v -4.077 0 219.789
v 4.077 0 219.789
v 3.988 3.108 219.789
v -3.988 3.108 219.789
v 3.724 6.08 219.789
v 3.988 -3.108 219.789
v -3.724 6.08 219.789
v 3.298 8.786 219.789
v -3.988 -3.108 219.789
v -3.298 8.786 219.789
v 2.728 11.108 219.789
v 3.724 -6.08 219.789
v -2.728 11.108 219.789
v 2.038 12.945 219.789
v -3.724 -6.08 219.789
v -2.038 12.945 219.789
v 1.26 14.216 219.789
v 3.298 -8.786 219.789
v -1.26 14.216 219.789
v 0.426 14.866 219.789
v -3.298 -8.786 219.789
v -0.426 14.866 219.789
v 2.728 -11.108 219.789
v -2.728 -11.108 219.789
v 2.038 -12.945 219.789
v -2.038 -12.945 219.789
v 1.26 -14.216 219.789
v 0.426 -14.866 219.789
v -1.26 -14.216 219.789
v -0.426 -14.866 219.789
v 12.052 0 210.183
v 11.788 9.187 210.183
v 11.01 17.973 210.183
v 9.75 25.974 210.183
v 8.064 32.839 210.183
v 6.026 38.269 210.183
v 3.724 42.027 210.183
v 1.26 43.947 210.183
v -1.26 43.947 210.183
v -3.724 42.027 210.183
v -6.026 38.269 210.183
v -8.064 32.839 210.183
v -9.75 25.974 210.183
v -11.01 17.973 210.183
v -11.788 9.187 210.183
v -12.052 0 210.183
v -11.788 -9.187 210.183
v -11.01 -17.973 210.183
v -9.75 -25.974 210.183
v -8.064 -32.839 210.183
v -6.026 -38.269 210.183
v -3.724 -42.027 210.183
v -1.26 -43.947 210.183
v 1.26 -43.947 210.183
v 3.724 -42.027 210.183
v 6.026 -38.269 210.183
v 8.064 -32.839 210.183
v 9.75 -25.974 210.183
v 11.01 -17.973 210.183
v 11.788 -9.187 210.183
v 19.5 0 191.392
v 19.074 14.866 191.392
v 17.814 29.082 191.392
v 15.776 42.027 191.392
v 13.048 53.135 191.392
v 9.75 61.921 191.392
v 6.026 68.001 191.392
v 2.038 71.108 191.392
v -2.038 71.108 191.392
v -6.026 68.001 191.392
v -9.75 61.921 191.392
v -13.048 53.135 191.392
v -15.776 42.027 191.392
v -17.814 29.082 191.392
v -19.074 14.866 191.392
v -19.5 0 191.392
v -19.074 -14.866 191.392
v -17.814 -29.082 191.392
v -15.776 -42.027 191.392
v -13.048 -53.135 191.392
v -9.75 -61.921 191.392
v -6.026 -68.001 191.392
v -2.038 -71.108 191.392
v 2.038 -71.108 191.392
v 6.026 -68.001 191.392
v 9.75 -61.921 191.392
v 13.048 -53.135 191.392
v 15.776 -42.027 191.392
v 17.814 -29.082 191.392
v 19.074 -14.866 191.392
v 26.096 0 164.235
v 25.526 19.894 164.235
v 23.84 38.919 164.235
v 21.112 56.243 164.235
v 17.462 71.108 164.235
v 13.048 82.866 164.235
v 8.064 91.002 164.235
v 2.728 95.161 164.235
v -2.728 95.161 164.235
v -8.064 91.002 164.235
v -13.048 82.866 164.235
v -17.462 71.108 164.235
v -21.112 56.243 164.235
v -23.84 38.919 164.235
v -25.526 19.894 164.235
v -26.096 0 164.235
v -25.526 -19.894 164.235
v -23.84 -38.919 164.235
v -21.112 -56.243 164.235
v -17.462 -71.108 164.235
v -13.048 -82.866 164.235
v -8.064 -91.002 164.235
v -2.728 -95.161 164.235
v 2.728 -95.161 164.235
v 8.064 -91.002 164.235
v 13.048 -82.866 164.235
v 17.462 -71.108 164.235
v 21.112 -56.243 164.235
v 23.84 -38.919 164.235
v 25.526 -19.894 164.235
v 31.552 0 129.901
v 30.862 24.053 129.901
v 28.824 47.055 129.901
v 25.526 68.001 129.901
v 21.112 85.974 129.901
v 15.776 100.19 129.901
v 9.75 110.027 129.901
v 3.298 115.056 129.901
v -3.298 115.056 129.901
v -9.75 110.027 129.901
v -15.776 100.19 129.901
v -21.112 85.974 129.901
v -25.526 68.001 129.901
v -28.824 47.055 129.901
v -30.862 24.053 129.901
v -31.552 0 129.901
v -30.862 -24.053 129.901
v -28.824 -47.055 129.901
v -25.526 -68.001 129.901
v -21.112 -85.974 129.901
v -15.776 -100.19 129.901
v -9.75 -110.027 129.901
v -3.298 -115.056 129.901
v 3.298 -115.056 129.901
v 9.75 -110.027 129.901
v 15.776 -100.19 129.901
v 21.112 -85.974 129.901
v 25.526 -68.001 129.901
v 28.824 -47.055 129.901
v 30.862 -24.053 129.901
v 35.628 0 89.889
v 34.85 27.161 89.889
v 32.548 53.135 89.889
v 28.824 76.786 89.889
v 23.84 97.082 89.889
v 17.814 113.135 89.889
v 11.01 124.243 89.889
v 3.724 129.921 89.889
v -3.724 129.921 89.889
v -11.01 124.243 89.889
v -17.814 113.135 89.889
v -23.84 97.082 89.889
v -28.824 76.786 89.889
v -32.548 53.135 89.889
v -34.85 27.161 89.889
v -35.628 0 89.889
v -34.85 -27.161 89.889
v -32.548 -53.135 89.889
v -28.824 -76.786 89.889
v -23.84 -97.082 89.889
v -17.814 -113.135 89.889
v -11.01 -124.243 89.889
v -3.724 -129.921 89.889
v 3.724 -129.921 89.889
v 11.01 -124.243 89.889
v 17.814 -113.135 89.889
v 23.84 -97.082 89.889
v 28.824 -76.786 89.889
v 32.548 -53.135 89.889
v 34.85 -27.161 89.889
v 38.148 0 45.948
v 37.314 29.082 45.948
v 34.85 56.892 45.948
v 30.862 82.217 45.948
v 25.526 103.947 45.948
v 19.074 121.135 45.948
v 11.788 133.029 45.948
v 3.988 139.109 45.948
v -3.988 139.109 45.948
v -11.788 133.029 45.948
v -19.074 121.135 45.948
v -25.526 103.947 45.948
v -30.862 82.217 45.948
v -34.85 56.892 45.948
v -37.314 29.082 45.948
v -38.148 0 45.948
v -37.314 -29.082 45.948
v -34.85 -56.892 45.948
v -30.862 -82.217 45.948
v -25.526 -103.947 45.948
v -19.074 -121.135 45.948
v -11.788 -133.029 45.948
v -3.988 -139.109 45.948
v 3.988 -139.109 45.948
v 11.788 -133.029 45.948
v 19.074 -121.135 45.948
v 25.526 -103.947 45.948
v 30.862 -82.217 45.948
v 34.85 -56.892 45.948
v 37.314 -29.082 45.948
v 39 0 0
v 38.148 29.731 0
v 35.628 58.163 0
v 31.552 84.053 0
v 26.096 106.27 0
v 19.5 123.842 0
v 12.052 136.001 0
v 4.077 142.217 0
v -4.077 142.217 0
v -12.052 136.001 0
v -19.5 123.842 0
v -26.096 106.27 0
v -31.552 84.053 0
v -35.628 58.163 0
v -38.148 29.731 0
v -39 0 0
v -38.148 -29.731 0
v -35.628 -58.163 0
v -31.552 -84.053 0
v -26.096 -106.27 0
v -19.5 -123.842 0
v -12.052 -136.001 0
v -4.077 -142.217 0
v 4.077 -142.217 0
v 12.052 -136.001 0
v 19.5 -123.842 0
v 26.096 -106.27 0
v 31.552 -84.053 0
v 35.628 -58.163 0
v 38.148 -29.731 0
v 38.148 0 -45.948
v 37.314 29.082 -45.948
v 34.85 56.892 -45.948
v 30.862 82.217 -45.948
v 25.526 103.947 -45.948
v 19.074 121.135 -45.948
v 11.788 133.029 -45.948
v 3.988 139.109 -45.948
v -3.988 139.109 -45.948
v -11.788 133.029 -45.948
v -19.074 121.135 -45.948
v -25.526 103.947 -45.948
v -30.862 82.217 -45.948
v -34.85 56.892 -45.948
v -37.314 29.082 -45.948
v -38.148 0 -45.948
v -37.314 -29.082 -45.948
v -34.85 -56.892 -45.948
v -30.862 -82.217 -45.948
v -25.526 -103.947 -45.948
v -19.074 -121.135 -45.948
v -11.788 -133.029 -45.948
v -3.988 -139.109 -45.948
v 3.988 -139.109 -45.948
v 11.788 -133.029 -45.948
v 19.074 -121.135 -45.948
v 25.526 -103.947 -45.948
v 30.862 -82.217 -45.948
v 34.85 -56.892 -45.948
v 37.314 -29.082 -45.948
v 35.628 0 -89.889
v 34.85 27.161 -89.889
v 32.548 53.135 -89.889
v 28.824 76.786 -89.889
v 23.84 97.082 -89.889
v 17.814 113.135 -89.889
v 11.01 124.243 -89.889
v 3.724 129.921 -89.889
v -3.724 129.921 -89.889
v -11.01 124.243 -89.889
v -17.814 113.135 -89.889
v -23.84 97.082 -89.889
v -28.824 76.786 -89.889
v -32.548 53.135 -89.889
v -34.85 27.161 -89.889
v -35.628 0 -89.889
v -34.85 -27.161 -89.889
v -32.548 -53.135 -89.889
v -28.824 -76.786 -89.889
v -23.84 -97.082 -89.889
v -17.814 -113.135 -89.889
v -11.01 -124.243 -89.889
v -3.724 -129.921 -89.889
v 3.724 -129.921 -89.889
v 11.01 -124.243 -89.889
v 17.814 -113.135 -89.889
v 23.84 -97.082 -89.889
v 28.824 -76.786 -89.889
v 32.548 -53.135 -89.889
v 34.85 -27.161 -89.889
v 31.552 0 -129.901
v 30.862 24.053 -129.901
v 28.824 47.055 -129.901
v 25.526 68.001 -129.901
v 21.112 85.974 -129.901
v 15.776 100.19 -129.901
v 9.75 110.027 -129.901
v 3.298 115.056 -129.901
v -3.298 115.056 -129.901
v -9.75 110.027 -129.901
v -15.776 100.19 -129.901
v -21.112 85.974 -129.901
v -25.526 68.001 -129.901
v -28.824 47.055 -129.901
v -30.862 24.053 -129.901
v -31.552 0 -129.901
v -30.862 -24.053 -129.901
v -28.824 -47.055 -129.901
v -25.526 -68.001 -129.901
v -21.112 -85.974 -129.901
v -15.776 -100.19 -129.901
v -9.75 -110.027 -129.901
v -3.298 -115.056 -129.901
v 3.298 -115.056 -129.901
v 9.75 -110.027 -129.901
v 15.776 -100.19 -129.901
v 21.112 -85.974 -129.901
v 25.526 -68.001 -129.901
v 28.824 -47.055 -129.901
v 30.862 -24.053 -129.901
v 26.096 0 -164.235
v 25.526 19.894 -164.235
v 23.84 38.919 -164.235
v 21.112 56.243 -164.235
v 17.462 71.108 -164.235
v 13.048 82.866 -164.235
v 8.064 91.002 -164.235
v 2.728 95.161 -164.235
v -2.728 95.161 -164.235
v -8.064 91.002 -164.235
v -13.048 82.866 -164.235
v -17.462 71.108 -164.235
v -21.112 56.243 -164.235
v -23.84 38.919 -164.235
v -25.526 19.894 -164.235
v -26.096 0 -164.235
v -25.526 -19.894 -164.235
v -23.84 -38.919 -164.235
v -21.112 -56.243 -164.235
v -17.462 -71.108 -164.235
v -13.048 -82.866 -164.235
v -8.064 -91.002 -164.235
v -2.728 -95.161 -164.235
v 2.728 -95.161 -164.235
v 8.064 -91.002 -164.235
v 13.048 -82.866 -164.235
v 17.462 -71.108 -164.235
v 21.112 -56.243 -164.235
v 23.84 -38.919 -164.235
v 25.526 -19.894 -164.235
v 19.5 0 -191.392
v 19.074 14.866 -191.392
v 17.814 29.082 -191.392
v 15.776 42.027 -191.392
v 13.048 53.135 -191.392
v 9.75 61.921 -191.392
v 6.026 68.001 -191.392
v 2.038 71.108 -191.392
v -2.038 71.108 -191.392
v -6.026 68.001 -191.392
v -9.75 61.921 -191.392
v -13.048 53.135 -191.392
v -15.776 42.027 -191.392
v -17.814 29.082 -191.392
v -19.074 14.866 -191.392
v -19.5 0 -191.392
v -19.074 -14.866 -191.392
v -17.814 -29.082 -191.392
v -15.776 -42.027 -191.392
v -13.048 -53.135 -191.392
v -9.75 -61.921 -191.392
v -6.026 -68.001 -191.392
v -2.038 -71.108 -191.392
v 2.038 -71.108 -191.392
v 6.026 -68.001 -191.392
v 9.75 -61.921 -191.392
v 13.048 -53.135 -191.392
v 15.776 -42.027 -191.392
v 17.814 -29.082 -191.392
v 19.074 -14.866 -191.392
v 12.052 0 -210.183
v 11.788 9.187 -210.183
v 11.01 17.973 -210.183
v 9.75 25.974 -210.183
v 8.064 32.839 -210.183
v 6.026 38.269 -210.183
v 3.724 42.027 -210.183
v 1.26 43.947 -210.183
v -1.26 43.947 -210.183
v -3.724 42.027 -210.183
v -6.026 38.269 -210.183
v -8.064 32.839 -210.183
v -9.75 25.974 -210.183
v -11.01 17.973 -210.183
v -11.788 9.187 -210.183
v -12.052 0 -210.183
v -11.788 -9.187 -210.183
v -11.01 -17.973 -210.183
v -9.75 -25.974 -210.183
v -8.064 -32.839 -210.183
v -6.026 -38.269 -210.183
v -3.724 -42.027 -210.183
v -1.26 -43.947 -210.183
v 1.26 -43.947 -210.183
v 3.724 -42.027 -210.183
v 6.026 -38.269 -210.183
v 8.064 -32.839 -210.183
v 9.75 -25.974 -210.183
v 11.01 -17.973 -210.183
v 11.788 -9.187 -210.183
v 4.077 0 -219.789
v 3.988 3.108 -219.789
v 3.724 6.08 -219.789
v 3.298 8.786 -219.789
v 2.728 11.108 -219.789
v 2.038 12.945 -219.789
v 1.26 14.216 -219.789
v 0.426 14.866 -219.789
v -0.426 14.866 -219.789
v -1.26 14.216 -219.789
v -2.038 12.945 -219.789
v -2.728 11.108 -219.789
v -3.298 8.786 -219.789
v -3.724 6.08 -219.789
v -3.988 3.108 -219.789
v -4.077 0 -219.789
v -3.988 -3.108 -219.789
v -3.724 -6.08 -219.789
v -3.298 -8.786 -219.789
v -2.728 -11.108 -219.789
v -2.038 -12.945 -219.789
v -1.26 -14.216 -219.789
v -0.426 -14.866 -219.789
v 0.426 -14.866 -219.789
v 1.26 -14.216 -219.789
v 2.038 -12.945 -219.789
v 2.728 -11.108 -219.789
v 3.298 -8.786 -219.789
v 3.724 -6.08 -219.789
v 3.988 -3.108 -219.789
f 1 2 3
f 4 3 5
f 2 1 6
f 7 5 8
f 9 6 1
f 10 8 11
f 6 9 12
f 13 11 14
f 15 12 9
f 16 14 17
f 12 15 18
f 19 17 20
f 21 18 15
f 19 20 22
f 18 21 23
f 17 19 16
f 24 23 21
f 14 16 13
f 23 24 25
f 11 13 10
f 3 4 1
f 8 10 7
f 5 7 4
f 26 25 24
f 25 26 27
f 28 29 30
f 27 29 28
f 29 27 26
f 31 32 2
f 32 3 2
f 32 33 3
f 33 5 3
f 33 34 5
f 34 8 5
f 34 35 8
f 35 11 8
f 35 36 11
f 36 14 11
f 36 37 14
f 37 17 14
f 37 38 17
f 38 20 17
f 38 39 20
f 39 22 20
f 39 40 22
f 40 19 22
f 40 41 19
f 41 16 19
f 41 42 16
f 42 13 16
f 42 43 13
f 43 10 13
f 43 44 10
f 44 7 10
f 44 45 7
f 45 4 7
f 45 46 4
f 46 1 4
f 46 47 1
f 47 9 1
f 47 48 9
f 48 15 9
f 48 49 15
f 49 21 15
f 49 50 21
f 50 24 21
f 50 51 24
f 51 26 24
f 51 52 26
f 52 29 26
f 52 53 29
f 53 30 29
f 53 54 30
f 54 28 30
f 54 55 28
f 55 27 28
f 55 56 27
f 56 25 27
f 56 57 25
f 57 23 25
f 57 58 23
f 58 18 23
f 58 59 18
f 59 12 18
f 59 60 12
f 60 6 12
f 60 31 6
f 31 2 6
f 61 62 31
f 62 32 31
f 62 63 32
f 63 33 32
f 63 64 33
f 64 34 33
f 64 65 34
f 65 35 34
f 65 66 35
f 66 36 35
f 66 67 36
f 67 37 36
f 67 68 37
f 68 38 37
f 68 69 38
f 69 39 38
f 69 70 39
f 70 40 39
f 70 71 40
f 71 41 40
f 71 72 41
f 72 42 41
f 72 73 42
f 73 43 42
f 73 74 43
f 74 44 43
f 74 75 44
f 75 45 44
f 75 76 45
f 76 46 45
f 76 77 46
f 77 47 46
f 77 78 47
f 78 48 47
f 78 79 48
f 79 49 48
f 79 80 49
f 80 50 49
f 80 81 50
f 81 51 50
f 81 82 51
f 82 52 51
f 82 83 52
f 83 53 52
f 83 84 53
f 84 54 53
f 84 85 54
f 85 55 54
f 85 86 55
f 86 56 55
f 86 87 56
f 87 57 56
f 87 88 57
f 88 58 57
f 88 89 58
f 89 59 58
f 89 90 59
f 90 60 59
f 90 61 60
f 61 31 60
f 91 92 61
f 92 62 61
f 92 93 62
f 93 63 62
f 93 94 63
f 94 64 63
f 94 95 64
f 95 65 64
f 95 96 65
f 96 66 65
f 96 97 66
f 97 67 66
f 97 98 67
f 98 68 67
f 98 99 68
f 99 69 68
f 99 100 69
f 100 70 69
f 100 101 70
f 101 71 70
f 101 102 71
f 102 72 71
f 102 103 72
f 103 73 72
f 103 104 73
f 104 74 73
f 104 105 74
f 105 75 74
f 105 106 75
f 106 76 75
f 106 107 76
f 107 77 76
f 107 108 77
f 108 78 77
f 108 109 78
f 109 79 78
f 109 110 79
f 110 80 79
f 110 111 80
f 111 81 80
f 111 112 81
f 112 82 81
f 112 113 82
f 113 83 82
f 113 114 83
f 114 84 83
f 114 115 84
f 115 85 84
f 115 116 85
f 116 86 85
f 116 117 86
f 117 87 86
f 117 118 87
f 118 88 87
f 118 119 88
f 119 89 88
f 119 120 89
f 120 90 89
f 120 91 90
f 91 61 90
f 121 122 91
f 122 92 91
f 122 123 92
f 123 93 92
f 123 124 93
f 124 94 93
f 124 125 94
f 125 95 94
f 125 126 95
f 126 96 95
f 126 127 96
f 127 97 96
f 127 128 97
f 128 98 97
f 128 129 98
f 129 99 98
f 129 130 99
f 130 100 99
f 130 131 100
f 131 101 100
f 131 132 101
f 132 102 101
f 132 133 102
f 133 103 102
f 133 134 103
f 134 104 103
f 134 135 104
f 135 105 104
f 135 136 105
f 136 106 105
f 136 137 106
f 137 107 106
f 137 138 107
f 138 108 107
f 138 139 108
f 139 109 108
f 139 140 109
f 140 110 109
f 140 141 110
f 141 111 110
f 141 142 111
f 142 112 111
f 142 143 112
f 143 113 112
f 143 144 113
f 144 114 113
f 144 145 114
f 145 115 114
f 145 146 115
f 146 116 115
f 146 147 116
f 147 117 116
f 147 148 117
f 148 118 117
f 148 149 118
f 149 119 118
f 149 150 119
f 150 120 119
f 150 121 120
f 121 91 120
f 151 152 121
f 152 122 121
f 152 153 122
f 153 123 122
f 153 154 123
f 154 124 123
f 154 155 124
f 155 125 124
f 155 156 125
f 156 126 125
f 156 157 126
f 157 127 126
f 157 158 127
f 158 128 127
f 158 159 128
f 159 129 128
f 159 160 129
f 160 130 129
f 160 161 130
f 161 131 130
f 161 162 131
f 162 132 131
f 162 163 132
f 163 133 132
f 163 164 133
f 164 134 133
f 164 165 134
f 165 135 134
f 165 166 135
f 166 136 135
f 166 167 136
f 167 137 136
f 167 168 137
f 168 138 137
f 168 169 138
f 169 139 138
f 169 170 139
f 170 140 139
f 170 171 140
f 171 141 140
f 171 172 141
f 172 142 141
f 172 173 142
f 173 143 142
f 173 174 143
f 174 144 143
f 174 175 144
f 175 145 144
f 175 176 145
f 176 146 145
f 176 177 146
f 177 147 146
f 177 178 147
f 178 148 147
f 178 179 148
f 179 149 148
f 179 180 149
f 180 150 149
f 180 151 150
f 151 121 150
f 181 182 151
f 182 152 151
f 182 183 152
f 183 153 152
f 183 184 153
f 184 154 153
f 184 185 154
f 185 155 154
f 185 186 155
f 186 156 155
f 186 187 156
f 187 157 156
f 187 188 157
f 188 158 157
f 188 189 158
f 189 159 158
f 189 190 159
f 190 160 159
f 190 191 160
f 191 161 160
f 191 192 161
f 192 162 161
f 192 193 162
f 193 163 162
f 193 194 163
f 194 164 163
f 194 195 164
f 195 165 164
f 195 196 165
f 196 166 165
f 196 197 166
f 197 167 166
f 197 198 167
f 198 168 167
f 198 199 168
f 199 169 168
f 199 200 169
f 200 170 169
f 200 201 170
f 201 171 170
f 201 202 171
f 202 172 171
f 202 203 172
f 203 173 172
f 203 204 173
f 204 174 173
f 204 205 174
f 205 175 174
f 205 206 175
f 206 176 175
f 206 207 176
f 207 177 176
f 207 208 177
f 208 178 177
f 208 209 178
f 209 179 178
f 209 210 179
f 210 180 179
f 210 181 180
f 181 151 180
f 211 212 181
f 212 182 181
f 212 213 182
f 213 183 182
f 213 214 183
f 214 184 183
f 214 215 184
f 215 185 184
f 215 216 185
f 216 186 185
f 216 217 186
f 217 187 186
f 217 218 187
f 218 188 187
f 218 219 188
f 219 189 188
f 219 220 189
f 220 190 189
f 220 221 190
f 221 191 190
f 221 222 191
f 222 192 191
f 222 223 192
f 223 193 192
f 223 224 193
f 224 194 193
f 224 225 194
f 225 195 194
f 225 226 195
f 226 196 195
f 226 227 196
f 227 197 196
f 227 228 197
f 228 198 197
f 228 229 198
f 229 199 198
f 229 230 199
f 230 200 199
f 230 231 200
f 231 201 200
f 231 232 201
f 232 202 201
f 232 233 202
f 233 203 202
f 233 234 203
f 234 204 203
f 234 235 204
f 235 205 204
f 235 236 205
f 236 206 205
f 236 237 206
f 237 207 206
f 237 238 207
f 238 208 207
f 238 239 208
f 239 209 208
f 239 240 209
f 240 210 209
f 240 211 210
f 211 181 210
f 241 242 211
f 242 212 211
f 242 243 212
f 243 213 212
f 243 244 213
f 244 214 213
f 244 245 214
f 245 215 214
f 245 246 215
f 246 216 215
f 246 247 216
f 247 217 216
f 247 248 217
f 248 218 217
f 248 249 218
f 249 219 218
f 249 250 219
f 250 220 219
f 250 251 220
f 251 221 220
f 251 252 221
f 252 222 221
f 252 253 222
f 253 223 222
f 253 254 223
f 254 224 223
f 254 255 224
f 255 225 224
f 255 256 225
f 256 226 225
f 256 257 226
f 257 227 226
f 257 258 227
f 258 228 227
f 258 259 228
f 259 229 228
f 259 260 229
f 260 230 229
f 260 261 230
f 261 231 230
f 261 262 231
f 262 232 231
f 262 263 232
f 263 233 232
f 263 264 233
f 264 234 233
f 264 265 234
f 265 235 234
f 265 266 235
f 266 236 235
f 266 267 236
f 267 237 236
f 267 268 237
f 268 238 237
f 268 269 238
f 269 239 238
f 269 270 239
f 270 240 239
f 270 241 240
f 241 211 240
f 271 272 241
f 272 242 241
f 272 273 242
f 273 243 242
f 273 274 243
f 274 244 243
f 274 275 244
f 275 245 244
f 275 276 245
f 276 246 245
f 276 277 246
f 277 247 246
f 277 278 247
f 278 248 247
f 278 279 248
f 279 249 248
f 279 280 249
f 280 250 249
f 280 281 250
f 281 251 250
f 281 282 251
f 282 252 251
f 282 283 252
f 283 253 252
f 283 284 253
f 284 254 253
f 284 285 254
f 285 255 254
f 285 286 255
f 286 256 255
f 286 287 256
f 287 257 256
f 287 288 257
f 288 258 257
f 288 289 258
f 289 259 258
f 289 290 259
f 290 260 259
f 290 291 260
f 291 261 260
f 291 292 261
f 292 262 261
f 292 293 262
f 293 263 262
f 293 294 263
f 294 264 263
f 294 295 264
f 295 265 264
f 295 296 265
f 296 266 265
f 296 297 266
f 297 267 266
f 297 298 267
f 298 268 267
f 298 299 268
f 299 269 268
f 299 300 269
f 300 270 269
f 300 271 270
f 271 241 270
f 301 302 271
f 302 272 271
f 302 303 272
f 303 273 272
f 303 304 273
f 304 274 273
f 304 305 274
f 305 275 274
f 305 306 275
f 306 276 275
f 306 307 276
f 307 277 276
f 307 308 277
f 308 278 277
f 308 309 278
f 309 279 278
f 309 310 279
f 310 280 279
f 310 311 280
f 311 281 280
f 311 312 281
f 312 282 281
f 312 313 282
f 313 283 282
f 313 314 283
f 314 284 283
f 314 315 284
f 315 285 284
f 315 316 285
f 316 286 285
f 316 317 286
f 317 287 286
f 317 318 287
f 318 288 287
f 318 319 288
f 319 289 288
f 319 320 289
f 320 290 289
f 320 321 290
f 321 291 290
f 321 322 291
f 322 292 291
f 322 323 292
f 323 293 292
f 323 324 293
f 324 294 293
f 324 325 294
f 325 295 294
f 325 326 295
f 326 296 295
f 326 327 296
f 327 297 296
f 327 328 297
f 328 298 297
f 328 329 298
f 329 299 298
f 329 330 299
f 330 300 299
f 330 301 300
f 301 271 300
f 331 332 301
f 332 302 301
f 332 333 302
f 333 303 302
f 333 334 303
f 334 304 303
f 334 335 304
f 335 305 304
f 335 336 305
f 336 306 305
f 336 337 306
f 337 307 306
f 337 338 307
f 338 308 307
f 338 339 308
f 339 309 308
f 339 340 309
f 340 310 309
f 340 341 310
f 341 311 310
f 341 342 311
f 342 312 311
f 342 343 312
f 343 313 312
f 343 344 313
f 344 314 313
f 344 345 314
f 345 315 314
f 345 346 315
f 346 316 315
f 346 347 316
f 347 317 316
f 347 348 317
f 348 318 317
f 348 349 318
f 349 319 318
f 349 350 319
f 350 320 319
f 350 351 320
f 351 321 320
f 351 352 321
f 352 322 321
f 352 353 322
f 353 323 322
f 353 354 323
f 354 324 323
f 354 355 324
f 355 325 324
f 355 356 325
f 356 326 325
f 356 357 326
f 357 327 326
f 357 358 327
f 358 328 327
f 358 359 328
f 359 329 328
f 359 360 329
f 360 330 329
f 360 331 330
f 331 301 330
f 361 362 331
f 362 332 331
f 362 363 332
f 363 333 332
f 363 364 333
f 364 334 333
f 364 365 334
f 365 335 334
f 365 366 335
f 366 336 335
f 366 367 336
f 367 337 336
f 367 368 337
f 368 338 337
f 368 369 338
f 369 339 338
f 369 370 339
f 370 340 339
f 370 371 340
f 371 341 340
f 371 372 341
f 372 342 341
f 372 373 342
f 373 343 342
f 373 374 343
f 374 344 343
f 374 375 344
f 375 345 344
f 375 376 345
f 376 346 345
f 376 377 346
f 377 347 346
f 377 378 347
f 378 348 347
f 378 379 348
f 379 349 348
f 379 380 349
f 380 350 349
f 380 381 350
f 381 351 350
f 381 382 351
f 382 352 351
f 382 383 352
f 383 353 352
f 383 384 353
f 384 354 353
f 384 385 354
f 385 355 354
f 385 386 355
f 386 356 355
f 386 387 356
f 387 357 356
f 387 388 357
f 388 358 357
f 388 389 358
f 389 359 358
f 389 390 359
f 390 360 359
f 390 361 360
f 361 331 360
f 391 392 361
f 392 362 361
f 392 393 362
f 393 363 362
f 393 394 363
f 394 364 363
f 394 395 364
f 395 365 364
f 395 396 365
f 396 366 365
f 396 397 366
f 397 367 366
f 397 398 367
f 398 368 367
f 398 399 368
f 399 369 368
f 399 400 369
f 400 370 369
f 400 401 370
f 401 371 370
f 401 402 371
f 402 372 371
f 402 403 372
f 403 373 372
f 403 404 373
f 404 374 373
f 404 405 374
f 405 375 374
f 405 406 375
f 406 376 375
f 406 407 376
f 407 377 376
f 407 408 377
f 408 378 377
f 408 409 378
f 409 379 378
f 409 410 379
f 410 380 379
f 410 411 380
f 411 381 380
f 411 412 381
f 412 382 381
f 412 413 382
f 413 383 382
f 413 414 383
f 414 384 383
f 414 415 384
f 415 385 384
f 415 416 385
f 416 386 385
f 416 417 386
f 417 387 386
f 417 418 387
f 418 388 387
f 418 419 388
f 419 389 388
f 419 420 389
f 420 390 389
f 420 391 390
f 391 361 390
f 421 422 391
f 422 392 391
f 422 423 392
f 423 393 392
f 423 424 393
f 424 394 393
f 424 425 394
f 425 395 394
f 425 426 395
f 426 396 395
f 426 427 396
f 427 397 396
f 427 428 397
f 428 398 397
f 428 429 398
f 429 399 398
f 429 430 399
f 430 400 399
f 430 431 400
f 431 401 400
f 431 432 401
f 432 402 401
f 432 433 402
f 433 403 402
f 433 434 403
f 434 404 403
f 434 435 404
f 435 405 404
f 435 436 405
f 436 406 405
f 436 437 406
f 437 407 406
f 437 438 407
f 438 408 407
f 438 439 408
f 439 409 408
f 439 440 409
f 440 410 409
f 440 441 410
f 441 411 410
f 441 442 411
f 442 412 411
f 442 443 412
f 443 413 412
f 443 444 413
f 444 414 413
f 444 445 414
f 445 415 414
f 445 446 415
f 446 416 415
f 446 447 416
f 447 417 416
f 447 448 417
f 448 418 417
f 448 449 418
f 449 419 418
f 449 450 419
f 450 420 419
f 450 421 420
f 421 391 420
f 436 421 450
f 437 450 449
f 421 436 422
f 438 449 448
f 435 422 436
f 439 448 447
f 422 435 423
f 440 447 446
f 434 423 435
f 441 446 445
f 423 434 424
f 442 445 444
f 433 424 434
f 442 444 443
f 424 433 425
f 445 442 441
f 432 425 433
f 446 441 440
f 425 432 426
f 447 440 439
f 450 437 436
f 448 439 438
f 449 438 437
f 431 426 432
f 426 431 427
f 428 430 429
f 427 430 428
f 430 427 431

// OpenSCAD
// Generated by SolidPython 1.0.1 on 2020-07-29 00:46:45


scale(v = [3, 11, 17]) {
	sphere(r = 13);
}
/***********************************************
*********      SolidPython code:      **********
************************************************
 
# import packages: SolidPython
from solid import *
from solid.utils import *
from itertools import chain, combinations, permutations


class Resize:

    def __init__(self, scad_file):
        self.scad_file = scad_file
        #self.scad_file = import_scad(scad_file)
        # cone/cylinder param:
        self.r1 = 0
        self.r2 = 0
        self.h = 0
        # rectangular prism param:
        self.w = 0
        self.l = 0
        # ellipse param:
        self.r = 0

    # import OpenScad code (file name corresponds to shape)


    # classify shape + parameters
    def assign(self, param1, param2, param3):
        if self.scad_file == 'cone.scad':
            self.r1 = param1
            self.r2 = param2
            self.h = param3
        elif self.scad_file == 'cylinder.scad':
            self.r1 = param1
            self.r2 = param2
            self.h = param3
        elif self.scad_file == 'rectangularPrism.scad':
            self.h = param1
            self.l = param2
            self.w = param3
        else:
            self.r = param1
            self.h = param2

    # resize parameters
    def iterate(self):
        x = range(3, 20, 2)
        i = 1
        if self.scad_file == 'cone.scad':
            tempList = list(permutations(x, 2))
            for temp in tempList:
                param1 = temp[0]
                param2 = temp[1]
                filepath = 'produced_scad_files/' + 'cone' + str(param1) + '_' + str(param2) + '_' + '.scad'
                scad_render_to_file(cylinder(h=param1, r1=param2, r2=0), filepath)

        elif self.scad_file == 'cylinder.scad':
            tempList = list(permutations(x, 3))
            for temp in tempList:
                param1 = temp[0]
                param2 = temp[1]
                filepath = 'produced_scad_files/' + 'cylinder' + str(param1) + '_' + str(param2) + '_' + '.scad'
                scad_render_to_file(cylinder(h=param1, r1=param2, r2=param2), filepath)

        elif self.scad_file == 'rectangularPrism.scad':
            tempList = list(permutations(x, 3))
            for temp in tempList:
                param1 = temp[0]
                param2 = temp[1]
                param3 = temp[2]
                filepath = 'produced_scad_files/' + 'rectangularPrism' + str(param1) + '_' + str(param2) + '_' + str(
                    param3) + '.scad'
                scad_render_to_file(cube(size=(param1, param2, param3)), filepath)

        elif self.scad_file == 'ellipse.scad':
            tempList = list(permutations(x, 4))
            for temp in tempList:
                param1 = temp[0]
                param2 = temp[1]
                param3 = temp[2]
                param4 = temp[3]
                filepath = 'produced_scad_files/' + 'ellipse' + str(param1) + '_' + str(param2) + '_' + str(param3) + '_' + str(param4) + '.scad'
                scad_render_to_file(scale([param1, param2, param3])(sphere(r=param4)), filepath)

    def render_to_scadfile(self):
        scad_render_to_file(scad, 'example.scad') 
 
************************************************/
